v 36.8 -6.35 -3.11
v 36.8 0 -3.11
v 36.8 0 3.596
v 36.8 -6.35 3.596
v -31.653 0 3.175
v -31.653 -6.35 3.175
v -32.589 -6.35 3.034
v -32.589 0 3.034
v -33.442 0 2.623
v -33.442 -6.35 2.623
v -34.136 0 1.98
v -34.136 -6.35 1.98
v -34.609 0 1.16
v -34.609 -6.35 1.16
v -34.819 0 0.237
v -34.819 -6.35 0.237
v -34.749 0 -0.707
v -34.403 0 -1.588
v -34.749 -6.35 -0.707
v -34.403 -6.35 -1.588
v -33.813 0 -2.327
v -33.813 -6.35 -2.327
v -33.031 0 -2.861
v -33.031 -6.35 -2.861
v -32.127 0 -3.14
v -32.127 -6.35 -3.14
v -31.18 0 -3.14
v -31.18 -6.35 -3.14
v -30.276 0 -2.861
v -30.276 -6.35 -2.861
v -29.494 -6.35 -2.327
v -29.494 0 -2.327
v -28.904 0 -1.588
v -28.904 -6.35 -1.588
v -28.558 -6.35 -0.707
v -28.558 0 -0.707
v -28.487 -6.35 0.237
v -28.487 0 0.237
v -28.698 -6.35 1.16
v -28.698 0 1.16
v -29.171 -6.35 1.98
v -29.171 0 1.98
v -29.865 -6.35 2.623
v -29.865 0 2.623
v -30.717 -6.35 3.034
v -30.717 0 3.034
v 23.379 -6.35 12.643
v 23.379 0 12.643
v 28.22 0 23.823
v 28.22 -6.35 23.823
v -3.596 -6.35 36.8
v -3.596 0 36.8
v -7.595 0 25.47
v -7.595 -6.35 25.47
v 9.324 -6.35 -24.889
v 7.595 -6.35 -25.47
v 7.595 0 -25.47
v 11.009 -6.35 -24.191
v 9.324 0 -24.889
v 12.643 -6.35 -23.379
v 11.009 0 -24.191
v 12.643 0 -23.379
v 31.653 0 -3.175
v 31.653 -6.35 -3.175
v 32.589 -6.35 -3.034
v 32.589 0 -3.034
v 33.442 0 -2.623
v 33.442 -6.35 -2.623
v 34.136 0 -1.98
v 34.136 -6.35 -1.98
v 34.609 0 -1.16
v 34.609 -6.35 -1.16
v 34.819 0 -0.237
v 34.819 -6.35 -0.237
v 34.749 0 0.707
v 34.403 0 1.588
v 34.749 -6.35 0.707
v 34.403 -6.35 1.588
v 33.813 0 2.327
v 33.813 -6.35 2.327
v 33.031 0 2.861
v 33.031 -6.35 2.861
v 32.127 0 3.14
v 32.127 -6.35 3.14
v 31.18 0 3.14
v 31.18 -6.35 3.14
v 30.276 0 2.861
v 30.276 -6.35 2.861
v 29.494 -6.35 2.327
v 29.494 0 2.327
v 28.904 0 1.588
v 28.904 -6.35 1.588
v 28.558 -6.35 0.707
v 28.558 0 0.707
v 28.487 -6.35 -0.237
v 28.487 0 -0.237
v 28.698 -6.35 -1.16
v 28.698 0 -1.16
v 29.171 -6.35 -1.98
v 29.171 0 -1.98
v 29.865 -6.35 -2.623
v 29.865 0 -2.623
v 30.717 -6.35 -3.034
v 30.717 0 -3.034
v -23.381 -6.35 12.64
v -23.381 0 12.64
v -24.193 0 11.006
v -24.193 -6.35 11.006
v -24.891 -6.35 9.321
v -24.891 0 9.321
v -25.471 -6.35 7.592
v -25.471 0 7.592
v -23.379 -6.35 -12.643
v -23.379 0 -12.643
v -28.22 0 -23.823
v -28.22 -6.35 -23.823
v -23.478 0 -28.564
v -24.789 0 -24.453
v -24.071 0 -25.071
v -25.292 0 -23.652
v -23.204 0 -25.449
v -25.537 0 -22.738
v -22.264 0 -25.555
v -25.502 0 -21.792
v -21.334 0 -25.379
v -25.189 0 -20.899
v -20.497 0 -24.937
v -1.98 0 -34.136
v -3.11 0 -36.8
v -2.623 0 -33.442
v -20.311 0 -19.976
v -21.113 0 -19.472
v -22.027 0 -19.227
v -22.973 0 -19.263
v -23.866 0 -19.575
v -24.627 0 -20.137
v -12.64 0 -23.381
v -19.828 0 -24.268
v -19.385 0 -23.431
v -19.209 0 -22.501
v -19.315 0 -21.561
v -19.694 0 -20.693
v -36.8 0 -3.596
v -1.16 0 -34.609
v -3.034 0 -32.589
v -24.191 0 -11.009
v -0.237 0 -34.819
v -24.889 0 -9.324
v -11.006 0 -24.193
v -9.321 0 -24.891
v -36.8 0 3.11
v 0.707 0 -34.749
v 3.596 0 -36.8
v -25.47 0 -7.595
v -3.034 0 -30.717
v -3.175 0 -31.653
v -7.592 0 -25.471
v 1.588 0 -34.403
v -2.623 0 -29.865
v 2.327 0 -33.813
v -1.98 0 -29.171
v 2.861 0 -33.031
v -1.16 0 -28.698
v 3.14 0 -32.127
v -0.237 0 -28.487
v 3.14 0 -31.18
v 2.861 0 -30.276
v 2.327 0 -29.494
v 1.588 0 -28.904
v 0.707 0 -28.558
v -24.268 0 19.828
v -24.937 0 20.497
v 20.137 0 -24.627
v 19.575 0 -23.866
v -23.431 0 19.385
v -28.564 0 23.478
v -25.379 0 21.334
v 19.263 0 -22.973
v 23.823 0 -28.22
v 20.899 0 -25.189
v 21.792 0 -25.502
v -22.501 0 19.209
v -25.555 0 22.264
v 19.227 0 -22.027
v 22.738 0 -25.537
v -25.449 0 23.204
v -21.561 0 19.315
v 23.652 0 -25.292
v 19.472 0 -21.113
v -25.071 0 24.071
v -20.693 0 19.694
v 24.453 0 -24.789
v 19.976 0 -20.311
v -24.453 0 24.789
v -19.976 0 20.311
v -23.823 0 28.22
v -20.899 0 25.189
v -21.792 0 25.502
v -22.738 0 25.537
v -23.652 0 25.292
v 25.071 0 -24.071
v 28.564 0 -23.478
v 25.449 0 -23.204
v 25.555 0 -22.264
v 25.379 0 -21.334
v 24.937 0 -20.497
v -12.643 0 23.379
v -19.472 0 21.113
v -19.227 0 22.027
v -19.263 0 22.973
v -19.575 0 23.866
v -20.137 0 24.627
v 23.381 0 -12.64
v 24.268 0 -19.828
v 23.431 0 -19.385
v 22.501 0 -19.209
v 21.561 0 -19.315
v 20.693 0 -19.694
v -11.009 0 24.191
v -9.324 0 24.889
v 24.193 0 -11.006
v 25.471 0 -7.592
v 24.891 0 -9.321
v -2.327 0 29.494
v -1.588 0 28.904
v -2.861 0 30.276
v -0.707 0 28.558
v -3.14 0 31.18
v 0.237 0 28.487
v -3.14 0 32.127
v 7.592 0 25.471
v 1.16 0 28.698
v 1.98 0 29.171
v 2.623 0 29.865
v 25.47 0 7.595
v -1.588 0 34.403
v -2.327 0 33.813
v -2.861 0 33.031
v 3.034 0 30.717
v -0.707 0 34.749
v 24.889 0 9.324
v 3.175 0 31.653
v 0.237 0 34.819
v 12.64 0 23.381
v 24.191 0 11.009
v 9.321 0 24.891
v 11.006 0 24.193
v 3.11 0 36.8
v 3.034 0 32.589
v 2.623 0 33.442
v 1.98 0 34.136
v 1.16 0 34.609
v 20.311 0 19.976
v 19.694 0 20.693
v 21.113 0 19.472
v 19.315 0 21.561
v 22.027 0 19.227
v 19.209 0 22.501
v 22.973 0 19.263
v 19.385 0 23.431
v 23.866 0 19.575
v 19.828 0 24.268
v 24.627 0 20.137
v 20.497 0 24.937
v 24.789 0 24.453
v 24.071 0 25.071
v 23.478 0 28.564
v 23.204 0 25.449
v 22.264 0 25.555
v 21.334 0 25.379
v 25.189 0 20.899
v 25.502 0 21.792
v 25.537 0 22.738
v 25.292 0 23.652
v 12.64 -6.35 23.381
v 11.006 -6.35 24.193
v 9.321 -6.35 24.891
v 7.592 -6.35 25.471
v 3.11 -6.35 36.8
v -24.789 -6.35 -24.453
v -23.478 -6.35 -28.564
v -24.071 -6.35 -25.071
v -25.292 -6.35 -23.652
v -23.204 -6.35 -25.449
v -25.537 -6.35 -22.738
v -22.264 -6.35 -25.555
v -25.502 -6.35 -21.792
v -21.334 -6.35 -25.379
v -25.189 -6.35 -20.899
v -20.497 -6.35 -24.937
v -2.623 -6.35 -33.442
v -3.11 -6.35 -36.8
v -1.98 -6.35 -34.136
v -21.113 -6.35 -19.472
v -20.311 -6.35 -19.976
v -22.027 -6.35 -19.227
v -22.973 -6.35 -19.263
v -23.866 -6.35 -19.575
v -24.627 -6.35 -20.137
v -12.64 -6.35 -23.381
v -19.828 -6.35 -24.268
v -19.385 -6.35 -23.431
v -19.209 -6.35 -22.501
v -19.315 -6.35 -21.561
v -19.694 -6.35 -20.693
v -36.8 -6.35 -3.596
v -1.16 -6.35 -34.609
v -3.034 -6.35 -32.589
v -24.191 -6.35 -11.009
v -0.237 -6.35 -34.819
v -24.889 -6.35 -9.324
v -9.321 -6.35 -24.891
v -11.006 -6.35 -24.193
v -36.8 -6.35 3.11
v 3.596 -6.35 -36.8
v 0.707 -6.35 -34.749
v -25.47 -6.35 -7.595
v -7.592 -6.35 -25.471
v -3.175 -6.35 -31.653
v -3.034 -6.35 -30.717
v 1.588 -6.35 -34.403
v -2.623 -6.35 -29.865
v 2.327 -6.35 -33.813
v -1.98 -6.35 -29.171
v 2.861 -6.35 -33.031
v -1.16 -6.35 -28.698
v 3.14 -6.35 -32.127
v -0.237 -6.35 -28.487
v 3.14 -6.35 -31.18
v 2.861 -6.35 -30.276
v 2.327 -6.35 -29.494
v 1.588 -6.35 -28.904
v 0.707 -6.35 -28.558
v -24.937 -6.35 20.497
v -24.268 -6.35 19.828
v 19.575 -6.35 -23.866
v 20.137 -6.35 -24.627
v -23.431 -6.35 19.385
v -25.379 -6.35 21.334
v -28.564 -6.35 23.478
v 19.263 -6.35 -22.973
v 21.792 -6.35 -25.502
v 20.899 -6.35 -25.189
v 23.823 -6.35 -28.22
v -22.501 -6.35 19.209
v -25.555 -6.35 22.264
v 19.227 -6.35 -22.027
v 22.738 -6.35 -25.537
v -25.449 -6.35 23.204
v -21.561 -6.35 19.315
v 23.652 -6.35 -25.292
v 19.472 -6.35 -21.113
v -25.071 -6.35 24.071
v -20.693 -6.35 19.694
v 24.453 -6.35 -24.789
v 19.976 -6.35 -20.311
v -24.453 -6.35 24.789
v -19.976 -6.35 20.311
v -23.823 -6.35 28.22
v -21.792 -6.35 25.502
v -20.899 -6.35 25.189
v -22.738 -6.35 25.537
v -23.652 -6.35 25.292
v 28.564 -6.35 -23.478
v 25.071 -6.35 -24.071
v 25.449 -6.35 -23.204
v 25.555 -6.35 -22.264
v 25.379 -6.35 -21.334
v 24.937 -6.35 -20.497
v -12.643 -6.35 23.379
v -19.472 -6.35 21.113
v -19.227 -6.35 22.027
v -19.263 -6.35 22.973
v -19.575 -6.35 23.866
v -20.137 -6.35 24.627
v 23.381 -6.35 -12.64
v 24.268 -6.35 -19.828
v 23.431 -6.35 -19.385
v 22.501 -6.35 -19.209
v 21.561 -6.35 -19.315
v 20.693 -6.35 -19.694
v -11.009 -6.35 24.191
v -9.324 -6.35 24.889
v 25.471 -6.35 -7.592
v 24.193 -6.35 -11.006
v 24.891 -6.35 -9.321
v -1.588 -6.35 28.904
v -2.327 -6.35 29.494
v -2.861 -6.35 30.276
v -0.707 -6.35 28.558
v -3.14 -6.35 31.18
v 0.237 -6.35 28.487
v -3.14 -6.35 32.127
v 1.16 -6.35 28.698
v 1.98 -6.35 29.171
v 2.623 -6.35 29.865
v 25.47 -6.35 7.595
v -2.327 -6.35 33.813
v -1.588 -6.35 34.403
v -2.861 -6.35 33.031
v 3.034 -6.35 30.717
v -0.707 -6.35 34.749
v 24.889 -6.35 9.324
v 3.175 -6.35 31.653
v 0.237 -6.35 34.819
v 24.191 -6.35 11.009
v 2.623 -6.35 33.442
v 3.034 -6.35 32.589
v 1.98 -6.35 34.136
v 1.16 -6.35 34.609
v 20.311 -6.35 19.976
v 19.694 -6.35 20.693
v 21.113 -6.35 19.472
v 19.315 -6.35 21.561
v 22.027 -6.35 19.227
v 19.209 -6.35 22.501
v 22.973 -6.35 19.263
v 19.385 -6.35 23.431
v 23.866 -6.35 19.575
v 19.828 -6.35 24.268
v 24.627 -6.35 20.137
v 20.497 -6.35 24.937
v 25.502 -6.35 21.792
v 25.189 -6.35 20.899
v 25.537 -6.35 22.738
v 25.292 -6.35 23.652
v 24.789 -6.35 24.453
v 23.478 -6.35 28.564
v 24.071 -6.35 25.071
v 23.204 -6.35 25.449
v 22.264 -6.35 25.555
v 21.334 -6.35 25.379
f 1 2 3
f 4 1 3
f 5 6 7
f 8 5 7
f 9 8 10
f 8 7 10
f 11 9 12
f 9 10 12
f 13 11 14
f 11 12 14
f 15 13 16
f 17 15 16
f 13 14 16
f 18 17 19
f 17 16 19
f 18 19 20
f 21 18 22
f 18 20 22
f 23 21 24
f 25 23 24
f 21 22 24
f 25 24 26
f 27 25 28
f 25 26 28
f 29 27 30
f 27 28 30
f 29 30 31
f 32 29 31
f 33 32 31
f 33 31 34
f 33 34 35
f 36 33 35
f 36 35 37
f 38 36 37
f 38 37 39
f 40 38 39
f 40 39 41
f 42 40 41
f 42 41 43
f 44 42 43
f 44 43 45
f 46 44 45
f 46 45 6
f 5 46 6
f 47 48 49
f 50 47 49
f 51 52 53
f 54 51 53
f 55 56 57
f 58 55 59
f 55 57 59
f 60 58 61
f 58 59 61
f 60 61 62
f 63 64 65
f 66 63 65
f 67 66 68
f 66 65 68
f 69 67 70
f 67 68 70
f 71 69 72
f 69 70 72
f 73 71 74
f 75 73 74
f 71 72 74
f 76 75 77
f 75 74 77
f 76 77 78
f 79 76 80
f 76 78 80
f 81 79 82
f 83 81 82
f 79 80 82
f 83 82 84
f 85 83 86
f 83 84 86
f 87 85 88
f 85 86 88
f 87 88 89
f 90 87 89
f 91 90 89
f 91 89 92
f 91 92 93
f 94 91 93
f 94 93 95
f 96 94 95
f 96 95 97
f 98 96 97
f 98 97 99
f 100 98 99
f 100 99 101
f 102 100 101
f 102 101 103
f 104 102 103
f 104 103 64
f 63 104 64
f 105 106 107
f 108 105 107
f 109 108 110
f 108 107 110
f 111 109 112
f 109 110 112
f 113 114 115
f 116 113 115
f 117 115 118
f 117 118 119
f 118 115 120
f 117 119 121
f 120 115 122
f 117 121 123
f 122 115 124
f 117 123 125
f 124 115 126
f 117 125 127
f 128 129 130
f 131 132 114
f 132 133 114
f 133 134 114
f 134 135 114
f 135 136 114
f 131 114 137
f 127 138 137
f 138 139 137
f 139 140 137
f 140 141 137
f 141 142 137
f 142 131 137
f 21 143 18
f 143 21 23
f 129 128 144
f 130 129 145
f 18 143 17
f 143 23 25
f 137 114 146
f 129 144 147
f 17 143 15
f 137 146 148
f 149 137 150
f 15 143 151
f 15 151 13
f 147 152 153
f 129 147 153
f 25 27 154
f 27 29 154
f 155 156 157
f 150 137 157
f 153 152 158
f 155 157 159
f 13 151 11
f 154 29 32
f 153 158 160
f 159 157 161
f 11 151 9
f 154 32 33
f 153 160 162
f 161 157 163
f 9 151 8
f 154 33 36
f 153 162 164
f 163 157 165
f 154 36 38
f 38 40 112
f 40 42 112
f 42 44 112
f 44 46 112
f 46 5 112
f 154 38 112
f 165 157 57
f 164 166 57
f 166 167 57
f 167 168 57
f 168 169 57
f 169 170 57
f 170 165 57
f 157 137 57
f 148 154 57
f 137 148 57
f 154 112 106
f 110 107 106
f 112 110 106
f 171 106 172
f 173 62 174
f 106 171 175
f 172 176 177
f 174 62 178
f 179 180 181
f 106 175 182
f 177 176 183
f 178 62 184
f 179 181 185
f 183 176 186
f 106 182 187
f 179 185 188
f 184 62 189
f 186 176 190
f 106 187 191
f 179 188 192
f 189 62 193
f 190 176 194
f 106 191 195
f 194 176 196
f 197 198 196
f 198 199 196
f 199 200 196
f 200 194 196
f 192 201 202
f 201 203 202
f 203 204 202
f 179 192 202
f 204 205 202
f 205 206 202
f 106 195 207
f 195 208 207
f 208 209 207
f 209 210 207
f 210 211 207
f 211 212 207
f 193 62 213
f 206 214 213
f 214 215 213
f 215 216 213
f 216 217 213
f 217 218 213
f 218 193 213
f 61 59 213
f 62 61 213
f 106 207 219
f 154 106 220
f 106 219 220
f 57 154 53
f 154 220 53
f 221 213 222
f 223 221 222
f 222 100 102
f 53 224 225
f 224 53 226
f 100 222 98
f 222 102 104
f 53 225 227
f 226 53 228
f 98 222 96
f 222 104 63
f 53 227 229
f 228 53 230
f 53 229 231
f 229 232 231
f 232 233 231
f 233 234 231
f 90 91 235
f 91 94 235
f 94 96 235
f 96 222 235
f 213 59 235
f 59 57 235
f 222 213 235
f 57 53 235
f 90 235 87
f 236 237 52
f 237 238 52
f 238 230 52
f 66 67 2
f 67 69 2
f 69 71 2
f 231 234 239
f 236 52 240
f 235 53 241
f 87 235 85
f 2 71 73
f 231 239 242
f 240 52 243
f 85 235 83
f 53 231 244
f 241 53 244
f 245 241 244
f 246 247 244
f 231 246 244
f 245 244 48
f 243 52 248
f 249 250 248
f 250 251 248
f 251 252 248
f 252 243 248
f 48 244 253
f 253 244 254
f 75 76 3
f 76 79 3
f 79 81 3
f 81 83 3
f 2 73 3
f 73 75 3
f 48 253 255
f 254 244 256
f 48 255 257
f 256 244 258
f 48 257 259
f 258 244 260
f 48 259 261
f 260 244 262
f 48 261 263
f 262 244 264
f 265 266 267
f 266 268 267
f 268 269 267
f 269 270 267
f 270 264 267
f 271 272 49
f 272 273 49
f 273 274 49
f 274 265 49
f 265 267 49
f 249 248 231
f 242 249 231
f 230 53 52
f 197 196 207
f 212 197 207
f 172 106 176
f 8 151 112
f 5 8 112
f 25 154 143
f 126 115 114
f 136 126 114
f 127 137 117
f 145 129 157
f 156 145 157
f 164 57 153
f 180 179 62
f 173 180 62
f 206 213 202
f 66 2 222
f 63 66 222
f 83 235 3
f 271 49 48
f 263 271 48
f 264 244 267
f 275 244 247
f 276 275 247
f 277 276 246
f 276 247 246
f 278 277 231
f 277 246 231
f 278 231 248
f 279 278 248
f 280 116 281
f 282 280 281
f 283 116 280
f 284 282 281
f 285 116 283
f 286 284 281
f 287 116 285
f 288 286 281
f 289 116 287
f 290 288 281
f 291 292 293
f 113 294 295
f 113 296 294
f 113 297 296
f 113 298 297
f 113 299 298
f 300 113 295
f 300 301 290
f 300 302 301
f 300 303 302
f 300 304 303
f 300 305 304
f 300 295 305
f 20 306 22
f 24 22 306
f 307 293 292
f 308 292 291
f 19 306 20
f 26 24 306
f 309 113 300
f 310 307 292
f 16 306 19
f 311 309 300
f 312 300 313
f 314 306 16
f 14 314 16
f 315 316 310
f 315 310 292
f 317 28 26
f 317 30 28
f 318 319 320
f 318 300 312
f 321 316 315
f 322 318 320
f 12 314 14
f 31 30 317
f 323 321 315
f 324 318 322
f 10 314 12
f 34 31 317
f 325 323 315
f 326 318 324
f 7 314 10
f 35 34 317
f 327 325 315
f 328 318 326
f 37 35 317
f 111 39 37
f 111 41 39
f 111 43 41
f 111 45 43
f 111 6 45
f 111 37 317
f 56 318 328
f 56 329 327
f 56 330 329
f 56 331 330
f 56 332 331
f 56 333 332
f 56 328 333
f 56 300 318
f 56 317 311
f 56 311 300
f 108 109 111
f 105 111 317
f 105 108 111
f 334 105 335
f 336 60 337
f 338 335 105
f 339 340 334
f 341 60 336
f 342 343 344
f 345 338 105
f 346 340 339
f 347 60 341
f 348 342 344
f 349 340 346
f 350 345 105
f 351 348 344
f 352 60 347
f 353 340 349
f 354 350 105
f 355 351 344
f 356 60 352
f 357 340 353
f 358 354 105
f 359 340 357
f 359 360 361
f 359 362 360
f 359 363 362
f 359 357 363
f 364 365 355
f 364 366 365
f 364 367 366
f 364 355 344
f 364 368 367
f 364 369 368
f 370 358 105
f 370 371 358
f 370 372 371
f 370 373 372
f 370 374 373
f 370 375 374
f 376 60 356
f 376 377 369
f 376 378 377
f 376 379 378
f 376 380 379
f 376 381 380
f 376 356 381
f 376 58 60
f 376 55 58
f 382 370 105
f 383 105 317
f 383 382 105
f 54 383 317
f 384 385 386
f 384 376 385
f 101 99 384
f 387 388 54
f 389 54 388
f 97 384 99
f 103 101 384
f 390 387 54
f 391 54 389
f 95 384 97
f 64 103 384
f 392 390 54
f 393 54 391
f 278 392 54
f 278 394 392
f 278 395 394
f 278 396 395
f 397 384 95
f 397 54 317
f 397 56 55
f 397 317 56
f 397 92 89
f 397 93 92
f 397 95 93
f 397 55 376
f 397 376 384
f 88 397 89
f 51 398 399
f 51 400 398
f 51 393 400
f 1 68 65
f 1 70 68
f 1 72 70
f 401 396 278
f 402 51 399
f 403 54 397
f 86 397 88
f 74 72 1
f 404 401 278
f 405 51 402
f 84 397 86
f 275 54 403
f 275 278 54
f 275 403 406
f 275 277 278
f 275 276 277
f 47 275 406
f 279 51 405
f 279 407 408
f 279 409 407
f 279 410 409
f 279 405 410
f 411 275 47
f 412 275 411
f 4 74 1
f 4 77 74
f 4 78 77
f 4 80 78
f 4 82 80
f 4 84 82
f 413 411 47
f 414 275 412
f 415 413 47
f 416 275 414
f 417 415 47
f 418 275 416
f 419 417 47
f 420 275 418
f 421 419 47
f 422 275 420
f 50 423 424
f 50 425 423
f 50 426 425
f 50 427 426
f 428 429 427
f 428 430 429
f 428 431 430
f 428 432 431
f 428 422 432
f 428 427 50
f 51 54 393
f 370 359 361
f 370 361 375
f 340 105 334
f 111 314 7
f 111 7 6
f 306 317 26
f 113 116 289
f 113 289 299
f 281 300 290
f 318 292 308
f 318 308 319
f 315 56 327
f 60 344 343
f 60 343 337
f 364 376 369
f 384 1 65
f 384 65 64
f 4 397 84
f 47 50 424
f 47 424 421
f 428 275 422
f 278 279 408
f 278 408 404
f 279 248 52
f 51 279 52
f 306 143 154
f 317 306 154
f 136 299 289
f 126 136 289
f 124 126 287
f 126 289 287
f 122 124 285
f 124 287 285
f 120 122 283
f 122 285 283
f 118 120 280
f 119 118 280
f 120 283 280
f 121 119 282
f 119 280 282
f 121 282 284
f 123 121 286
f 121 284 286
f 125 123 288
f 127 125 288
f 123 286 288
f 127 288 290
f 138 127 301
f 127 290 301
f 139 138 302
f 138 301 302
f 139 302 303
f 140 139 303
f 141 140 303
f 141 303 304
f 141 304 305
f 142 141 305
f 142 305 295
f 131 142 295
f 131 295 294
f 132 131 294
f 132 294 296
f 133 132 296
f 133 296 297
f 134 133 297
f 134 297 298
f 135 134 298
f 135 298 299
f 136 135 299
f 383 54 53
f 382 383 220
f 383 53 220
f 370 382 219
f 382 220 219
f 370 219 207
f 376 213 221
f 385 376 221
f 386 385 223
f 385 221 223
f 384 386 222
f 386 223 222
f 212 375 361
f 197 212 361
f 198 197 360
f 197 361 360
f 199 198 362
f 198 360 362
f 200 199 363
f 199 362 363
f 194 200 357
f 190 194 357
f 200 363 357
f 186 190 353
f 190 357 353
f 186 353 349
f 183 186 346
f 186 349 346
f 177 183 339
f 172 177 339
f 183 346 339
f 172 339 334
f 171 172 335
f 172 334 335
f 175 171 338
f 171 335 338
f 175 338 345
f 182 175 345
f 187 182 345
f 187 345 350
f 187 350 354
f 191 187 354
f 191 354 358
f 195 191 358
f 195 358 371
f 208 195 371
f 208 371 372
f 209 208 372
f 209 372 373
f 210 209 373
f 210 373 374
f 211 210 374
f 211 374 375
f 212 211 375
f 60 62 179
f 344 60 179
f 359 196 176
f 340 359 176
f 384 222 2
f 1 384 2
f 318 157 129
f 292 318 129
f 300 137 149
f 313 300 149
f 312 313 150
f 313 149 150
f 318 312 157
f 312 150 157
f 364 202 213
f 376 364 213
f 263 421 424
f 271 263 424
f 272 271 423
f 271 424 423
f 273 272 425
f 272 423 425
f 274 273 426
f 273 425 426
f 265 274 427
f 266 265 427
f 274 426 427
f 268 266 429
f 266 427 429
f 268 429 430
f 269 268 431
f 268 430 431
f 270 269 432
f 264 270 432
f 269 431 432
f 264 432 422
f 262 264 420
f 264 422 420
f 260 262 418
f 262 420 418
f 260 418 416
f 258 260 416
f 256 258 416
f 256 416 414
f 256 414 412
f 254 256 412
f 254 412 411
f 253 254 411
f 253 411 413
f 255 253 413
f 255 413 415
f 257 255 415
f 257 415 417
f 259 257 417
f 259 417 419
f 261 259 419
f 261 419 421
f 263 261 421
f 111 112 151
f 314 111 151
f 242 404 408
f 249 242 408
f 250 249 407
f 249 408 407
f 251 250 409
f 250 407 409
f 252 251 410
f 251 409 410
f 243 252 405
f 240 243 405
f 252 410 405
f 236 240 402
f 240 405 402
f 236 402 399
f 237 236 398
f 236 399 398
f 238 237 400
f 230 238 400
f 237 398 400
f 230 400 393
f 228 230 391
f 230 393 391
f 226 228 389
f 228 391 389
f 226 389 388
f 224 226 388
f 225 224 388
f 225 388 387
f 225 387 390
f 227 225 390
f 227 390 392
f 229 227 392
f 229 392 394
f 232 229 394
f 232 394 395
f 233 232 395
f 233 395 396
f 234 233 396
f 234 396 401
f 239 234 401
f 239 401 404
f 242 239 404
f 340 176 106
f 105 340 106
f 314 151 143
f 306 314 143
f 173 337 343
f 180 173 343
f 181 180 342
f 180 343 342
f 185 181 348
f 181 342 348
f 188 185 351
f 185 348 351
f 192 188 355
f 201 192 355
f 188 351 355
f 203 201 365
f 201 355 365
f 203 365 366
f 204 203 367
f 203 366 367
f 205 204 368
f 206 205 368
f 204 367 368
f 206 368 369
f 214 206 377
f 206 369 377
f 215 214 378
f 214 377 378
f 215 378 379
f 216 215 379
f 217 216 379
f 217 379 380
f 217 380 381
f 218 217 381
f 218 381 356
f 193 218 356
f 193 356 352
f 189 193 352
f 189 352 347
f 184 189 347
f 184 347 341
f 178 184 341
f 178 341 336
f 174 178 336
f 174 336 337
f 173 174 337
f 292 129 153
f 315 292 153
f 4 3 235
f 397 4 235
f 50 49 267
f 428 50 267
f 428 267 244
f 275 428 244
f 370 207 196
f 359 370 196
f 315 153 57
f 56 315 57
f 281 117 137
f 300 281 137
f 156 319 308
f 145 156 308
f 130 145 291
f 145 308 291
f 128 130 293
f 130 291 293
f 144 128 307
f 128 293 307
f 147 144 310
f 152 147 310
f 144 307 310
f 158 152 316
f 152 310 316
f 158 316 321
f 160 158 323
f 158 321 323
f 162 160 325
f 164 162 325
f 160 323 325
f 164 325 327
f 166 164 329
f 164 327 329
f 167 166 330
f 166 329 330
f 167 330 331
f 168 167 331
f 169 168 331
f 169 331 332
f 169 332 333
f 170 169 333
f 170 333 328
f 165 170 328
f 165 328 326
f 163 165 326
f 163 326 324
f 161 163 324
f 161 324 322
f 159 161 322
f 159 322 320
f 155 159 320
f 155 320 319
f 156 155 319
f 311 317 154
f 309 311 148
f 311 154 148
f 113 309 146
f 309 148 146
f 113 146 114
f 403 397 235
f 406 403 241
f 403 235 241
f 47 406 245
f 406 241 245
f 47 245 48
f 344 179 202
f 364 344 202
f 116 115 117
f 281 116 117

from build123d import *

# Parameters (mm, degrees)
F0_R            = 38.1
F1_DEPTH        = 6.35
F2_R            = 3.175
F3_DEPTH        = 6.351
F3_COPIES_COUNT = 8
F5_DEPTH        = 25.4


# Not quite as in the source:
# - a pattern or mirror of a feature is missing from the dataset's text; its kind, count and spacing are read off the source's solid


with BuildPart() as f1:
    # F0 (on Front) → F1 (new body)
    with BuildSketch(Plane.XZ):
        Circle(F0_R)
    extrude(amount=F1_DEPTH)

    # F2 (on face) → F3 (cut, through all)
    with BuildSketch(Plane.XZ.offset(6.35)):
        with Locations((0, 31.6533222795)):
            Circle(F2_R)
    f3 = extrude(amount=-F3_DEPTH, mode=Mode.SUBTRACT)

    # F3_copies: F3 ×8 about axis
    f3_copies_axis = Axis((0, 0, 0), (0, 1, 0))
    for i in range(1, F3_COPIES_COUNT):
        add(f3.rotate(f3_copies_axis, i * 360 / F3_COPIES_COUNT), mode=Mode.SUBTRACT)

    # F4 (on Front) → F5 (intersect)
    with BuildSketch(Plane.XZ):
        with BuildLine():
            Line((3.1097339764, 36.7998792025), (-3.5963490721, 36.7998792025))
            Line((-3.5963490721, 36.7998792025), (-7.5950432294, 25.4702454258))
            ThreePointArc((-7.5950432294, 25.4702454258), (-10.1728112394, 24.5546735917), (-12.6428176097, 23.378991565))
            Line((-12.6428176097, 23.378991565), (-23.8225301486, 28.2203581134))
            Line((-23.8225301486, 28.2203581134), (-28.5644469474, 23.4784413146))
            Line((-28.5644469474, 23.4784413146), (-23.38068983, 12.6396766882))
            ThreePointArc((-23.38068983, 12.6396766882), (-24.5560400177, 10.1695123954), (-25.4712655381, 7.5916214078))
            Line((-25.4712655381, 7.5916214078), (-36.7998792025, 3.1097339764))
            Line((-36.7998792025, 3.1097339764), (-36.7998792025, -3.5963490721))
            Line((-36.7998792025, -3.5963490721), (-25.4702454258, -7.5950432294))
            ThreePointArc((-25.4702454258, -7.5950432294), (-24.5546735917, -10.1728112394), (-23.378991565, -12.6428176097))
            Line((-23.378991565, -12.6428176097), (-28.2203581134, -23.8225301486))
            Line((-28.2203581134, -23.8225301486), (-23.4784413146, -28.5644469474))
            Line((-23.4784413146, -28.5644469474), (-12.6396766882, -23.38068983))
            ThreePointArc((-12.6396766882, -23.38068983), (-10.1695123954, -24.5560400177), (-7.5916214078, -25.4712655381))
            Line((-7.5916214078, -25.4712655381), (-3.1097339764, -36.7998792025))
            Line((-3.1097339764, -36.7998792025), (3.5963490721, -36.7998792025))
            Line((3.5963490721, -36.7998792025), (7.5950432294, -25.4702454258))
            ThreePointArc((7.5950432294, -25.4702454258), (10.1728112394, -24.5546735917), (12.6428176097, -23.378991565))
            Line((12.6428176097, -23.378991565), (23.8225301486, -28.2203581134))
            Line((23.8225301486, -28.2203581134), (28.5644469474, -23.4784413146))
            Line((28.5644469474, -23.4784413146), (23.38068983, -12.6396766882))
            ThreePointArc((23.38068983, -12.6396766882), (24.5560400177, -10.1695123954), (25.4712655381, -7.5916214078))
            Line((25.4712655381, -7.5916214078), (36.7998792025, -3.1097339764))
            Line((36.7998792025, -3.1097339764), (36.7998792025, 3.5963490721))
            Line((36.7998792025, 3.5963490721), (25.4702454258, 7.5950432294))
            ThreePointArc((25.4702454258, 7.5950432294), (24.5546735917, 10.1728112394), (23.378991565, 12.6428176097))
            Line((23.378991565, 12.6428176097), (28.2203581134, 23.8225301486))
            Line((28.2203581134, 23.8225301486), (23.4784413146, 28.5644469474))
            Line((23.4784413146, 28.5644469474), (12.6396766882, 23.38068983))
            ThreePointArc((12.6396766882, 23.38068983), (10.1695123954, 24.5560400177), (7.5916214078, 25.4712655381))
            Line((7.5916214078, 25.4712655381), (3.1097339764, 36.7998792025))
        make_face()
    extrude(amount=F5_DEPTH, mode=Mode.INTERSECT)


solid = f1.part
